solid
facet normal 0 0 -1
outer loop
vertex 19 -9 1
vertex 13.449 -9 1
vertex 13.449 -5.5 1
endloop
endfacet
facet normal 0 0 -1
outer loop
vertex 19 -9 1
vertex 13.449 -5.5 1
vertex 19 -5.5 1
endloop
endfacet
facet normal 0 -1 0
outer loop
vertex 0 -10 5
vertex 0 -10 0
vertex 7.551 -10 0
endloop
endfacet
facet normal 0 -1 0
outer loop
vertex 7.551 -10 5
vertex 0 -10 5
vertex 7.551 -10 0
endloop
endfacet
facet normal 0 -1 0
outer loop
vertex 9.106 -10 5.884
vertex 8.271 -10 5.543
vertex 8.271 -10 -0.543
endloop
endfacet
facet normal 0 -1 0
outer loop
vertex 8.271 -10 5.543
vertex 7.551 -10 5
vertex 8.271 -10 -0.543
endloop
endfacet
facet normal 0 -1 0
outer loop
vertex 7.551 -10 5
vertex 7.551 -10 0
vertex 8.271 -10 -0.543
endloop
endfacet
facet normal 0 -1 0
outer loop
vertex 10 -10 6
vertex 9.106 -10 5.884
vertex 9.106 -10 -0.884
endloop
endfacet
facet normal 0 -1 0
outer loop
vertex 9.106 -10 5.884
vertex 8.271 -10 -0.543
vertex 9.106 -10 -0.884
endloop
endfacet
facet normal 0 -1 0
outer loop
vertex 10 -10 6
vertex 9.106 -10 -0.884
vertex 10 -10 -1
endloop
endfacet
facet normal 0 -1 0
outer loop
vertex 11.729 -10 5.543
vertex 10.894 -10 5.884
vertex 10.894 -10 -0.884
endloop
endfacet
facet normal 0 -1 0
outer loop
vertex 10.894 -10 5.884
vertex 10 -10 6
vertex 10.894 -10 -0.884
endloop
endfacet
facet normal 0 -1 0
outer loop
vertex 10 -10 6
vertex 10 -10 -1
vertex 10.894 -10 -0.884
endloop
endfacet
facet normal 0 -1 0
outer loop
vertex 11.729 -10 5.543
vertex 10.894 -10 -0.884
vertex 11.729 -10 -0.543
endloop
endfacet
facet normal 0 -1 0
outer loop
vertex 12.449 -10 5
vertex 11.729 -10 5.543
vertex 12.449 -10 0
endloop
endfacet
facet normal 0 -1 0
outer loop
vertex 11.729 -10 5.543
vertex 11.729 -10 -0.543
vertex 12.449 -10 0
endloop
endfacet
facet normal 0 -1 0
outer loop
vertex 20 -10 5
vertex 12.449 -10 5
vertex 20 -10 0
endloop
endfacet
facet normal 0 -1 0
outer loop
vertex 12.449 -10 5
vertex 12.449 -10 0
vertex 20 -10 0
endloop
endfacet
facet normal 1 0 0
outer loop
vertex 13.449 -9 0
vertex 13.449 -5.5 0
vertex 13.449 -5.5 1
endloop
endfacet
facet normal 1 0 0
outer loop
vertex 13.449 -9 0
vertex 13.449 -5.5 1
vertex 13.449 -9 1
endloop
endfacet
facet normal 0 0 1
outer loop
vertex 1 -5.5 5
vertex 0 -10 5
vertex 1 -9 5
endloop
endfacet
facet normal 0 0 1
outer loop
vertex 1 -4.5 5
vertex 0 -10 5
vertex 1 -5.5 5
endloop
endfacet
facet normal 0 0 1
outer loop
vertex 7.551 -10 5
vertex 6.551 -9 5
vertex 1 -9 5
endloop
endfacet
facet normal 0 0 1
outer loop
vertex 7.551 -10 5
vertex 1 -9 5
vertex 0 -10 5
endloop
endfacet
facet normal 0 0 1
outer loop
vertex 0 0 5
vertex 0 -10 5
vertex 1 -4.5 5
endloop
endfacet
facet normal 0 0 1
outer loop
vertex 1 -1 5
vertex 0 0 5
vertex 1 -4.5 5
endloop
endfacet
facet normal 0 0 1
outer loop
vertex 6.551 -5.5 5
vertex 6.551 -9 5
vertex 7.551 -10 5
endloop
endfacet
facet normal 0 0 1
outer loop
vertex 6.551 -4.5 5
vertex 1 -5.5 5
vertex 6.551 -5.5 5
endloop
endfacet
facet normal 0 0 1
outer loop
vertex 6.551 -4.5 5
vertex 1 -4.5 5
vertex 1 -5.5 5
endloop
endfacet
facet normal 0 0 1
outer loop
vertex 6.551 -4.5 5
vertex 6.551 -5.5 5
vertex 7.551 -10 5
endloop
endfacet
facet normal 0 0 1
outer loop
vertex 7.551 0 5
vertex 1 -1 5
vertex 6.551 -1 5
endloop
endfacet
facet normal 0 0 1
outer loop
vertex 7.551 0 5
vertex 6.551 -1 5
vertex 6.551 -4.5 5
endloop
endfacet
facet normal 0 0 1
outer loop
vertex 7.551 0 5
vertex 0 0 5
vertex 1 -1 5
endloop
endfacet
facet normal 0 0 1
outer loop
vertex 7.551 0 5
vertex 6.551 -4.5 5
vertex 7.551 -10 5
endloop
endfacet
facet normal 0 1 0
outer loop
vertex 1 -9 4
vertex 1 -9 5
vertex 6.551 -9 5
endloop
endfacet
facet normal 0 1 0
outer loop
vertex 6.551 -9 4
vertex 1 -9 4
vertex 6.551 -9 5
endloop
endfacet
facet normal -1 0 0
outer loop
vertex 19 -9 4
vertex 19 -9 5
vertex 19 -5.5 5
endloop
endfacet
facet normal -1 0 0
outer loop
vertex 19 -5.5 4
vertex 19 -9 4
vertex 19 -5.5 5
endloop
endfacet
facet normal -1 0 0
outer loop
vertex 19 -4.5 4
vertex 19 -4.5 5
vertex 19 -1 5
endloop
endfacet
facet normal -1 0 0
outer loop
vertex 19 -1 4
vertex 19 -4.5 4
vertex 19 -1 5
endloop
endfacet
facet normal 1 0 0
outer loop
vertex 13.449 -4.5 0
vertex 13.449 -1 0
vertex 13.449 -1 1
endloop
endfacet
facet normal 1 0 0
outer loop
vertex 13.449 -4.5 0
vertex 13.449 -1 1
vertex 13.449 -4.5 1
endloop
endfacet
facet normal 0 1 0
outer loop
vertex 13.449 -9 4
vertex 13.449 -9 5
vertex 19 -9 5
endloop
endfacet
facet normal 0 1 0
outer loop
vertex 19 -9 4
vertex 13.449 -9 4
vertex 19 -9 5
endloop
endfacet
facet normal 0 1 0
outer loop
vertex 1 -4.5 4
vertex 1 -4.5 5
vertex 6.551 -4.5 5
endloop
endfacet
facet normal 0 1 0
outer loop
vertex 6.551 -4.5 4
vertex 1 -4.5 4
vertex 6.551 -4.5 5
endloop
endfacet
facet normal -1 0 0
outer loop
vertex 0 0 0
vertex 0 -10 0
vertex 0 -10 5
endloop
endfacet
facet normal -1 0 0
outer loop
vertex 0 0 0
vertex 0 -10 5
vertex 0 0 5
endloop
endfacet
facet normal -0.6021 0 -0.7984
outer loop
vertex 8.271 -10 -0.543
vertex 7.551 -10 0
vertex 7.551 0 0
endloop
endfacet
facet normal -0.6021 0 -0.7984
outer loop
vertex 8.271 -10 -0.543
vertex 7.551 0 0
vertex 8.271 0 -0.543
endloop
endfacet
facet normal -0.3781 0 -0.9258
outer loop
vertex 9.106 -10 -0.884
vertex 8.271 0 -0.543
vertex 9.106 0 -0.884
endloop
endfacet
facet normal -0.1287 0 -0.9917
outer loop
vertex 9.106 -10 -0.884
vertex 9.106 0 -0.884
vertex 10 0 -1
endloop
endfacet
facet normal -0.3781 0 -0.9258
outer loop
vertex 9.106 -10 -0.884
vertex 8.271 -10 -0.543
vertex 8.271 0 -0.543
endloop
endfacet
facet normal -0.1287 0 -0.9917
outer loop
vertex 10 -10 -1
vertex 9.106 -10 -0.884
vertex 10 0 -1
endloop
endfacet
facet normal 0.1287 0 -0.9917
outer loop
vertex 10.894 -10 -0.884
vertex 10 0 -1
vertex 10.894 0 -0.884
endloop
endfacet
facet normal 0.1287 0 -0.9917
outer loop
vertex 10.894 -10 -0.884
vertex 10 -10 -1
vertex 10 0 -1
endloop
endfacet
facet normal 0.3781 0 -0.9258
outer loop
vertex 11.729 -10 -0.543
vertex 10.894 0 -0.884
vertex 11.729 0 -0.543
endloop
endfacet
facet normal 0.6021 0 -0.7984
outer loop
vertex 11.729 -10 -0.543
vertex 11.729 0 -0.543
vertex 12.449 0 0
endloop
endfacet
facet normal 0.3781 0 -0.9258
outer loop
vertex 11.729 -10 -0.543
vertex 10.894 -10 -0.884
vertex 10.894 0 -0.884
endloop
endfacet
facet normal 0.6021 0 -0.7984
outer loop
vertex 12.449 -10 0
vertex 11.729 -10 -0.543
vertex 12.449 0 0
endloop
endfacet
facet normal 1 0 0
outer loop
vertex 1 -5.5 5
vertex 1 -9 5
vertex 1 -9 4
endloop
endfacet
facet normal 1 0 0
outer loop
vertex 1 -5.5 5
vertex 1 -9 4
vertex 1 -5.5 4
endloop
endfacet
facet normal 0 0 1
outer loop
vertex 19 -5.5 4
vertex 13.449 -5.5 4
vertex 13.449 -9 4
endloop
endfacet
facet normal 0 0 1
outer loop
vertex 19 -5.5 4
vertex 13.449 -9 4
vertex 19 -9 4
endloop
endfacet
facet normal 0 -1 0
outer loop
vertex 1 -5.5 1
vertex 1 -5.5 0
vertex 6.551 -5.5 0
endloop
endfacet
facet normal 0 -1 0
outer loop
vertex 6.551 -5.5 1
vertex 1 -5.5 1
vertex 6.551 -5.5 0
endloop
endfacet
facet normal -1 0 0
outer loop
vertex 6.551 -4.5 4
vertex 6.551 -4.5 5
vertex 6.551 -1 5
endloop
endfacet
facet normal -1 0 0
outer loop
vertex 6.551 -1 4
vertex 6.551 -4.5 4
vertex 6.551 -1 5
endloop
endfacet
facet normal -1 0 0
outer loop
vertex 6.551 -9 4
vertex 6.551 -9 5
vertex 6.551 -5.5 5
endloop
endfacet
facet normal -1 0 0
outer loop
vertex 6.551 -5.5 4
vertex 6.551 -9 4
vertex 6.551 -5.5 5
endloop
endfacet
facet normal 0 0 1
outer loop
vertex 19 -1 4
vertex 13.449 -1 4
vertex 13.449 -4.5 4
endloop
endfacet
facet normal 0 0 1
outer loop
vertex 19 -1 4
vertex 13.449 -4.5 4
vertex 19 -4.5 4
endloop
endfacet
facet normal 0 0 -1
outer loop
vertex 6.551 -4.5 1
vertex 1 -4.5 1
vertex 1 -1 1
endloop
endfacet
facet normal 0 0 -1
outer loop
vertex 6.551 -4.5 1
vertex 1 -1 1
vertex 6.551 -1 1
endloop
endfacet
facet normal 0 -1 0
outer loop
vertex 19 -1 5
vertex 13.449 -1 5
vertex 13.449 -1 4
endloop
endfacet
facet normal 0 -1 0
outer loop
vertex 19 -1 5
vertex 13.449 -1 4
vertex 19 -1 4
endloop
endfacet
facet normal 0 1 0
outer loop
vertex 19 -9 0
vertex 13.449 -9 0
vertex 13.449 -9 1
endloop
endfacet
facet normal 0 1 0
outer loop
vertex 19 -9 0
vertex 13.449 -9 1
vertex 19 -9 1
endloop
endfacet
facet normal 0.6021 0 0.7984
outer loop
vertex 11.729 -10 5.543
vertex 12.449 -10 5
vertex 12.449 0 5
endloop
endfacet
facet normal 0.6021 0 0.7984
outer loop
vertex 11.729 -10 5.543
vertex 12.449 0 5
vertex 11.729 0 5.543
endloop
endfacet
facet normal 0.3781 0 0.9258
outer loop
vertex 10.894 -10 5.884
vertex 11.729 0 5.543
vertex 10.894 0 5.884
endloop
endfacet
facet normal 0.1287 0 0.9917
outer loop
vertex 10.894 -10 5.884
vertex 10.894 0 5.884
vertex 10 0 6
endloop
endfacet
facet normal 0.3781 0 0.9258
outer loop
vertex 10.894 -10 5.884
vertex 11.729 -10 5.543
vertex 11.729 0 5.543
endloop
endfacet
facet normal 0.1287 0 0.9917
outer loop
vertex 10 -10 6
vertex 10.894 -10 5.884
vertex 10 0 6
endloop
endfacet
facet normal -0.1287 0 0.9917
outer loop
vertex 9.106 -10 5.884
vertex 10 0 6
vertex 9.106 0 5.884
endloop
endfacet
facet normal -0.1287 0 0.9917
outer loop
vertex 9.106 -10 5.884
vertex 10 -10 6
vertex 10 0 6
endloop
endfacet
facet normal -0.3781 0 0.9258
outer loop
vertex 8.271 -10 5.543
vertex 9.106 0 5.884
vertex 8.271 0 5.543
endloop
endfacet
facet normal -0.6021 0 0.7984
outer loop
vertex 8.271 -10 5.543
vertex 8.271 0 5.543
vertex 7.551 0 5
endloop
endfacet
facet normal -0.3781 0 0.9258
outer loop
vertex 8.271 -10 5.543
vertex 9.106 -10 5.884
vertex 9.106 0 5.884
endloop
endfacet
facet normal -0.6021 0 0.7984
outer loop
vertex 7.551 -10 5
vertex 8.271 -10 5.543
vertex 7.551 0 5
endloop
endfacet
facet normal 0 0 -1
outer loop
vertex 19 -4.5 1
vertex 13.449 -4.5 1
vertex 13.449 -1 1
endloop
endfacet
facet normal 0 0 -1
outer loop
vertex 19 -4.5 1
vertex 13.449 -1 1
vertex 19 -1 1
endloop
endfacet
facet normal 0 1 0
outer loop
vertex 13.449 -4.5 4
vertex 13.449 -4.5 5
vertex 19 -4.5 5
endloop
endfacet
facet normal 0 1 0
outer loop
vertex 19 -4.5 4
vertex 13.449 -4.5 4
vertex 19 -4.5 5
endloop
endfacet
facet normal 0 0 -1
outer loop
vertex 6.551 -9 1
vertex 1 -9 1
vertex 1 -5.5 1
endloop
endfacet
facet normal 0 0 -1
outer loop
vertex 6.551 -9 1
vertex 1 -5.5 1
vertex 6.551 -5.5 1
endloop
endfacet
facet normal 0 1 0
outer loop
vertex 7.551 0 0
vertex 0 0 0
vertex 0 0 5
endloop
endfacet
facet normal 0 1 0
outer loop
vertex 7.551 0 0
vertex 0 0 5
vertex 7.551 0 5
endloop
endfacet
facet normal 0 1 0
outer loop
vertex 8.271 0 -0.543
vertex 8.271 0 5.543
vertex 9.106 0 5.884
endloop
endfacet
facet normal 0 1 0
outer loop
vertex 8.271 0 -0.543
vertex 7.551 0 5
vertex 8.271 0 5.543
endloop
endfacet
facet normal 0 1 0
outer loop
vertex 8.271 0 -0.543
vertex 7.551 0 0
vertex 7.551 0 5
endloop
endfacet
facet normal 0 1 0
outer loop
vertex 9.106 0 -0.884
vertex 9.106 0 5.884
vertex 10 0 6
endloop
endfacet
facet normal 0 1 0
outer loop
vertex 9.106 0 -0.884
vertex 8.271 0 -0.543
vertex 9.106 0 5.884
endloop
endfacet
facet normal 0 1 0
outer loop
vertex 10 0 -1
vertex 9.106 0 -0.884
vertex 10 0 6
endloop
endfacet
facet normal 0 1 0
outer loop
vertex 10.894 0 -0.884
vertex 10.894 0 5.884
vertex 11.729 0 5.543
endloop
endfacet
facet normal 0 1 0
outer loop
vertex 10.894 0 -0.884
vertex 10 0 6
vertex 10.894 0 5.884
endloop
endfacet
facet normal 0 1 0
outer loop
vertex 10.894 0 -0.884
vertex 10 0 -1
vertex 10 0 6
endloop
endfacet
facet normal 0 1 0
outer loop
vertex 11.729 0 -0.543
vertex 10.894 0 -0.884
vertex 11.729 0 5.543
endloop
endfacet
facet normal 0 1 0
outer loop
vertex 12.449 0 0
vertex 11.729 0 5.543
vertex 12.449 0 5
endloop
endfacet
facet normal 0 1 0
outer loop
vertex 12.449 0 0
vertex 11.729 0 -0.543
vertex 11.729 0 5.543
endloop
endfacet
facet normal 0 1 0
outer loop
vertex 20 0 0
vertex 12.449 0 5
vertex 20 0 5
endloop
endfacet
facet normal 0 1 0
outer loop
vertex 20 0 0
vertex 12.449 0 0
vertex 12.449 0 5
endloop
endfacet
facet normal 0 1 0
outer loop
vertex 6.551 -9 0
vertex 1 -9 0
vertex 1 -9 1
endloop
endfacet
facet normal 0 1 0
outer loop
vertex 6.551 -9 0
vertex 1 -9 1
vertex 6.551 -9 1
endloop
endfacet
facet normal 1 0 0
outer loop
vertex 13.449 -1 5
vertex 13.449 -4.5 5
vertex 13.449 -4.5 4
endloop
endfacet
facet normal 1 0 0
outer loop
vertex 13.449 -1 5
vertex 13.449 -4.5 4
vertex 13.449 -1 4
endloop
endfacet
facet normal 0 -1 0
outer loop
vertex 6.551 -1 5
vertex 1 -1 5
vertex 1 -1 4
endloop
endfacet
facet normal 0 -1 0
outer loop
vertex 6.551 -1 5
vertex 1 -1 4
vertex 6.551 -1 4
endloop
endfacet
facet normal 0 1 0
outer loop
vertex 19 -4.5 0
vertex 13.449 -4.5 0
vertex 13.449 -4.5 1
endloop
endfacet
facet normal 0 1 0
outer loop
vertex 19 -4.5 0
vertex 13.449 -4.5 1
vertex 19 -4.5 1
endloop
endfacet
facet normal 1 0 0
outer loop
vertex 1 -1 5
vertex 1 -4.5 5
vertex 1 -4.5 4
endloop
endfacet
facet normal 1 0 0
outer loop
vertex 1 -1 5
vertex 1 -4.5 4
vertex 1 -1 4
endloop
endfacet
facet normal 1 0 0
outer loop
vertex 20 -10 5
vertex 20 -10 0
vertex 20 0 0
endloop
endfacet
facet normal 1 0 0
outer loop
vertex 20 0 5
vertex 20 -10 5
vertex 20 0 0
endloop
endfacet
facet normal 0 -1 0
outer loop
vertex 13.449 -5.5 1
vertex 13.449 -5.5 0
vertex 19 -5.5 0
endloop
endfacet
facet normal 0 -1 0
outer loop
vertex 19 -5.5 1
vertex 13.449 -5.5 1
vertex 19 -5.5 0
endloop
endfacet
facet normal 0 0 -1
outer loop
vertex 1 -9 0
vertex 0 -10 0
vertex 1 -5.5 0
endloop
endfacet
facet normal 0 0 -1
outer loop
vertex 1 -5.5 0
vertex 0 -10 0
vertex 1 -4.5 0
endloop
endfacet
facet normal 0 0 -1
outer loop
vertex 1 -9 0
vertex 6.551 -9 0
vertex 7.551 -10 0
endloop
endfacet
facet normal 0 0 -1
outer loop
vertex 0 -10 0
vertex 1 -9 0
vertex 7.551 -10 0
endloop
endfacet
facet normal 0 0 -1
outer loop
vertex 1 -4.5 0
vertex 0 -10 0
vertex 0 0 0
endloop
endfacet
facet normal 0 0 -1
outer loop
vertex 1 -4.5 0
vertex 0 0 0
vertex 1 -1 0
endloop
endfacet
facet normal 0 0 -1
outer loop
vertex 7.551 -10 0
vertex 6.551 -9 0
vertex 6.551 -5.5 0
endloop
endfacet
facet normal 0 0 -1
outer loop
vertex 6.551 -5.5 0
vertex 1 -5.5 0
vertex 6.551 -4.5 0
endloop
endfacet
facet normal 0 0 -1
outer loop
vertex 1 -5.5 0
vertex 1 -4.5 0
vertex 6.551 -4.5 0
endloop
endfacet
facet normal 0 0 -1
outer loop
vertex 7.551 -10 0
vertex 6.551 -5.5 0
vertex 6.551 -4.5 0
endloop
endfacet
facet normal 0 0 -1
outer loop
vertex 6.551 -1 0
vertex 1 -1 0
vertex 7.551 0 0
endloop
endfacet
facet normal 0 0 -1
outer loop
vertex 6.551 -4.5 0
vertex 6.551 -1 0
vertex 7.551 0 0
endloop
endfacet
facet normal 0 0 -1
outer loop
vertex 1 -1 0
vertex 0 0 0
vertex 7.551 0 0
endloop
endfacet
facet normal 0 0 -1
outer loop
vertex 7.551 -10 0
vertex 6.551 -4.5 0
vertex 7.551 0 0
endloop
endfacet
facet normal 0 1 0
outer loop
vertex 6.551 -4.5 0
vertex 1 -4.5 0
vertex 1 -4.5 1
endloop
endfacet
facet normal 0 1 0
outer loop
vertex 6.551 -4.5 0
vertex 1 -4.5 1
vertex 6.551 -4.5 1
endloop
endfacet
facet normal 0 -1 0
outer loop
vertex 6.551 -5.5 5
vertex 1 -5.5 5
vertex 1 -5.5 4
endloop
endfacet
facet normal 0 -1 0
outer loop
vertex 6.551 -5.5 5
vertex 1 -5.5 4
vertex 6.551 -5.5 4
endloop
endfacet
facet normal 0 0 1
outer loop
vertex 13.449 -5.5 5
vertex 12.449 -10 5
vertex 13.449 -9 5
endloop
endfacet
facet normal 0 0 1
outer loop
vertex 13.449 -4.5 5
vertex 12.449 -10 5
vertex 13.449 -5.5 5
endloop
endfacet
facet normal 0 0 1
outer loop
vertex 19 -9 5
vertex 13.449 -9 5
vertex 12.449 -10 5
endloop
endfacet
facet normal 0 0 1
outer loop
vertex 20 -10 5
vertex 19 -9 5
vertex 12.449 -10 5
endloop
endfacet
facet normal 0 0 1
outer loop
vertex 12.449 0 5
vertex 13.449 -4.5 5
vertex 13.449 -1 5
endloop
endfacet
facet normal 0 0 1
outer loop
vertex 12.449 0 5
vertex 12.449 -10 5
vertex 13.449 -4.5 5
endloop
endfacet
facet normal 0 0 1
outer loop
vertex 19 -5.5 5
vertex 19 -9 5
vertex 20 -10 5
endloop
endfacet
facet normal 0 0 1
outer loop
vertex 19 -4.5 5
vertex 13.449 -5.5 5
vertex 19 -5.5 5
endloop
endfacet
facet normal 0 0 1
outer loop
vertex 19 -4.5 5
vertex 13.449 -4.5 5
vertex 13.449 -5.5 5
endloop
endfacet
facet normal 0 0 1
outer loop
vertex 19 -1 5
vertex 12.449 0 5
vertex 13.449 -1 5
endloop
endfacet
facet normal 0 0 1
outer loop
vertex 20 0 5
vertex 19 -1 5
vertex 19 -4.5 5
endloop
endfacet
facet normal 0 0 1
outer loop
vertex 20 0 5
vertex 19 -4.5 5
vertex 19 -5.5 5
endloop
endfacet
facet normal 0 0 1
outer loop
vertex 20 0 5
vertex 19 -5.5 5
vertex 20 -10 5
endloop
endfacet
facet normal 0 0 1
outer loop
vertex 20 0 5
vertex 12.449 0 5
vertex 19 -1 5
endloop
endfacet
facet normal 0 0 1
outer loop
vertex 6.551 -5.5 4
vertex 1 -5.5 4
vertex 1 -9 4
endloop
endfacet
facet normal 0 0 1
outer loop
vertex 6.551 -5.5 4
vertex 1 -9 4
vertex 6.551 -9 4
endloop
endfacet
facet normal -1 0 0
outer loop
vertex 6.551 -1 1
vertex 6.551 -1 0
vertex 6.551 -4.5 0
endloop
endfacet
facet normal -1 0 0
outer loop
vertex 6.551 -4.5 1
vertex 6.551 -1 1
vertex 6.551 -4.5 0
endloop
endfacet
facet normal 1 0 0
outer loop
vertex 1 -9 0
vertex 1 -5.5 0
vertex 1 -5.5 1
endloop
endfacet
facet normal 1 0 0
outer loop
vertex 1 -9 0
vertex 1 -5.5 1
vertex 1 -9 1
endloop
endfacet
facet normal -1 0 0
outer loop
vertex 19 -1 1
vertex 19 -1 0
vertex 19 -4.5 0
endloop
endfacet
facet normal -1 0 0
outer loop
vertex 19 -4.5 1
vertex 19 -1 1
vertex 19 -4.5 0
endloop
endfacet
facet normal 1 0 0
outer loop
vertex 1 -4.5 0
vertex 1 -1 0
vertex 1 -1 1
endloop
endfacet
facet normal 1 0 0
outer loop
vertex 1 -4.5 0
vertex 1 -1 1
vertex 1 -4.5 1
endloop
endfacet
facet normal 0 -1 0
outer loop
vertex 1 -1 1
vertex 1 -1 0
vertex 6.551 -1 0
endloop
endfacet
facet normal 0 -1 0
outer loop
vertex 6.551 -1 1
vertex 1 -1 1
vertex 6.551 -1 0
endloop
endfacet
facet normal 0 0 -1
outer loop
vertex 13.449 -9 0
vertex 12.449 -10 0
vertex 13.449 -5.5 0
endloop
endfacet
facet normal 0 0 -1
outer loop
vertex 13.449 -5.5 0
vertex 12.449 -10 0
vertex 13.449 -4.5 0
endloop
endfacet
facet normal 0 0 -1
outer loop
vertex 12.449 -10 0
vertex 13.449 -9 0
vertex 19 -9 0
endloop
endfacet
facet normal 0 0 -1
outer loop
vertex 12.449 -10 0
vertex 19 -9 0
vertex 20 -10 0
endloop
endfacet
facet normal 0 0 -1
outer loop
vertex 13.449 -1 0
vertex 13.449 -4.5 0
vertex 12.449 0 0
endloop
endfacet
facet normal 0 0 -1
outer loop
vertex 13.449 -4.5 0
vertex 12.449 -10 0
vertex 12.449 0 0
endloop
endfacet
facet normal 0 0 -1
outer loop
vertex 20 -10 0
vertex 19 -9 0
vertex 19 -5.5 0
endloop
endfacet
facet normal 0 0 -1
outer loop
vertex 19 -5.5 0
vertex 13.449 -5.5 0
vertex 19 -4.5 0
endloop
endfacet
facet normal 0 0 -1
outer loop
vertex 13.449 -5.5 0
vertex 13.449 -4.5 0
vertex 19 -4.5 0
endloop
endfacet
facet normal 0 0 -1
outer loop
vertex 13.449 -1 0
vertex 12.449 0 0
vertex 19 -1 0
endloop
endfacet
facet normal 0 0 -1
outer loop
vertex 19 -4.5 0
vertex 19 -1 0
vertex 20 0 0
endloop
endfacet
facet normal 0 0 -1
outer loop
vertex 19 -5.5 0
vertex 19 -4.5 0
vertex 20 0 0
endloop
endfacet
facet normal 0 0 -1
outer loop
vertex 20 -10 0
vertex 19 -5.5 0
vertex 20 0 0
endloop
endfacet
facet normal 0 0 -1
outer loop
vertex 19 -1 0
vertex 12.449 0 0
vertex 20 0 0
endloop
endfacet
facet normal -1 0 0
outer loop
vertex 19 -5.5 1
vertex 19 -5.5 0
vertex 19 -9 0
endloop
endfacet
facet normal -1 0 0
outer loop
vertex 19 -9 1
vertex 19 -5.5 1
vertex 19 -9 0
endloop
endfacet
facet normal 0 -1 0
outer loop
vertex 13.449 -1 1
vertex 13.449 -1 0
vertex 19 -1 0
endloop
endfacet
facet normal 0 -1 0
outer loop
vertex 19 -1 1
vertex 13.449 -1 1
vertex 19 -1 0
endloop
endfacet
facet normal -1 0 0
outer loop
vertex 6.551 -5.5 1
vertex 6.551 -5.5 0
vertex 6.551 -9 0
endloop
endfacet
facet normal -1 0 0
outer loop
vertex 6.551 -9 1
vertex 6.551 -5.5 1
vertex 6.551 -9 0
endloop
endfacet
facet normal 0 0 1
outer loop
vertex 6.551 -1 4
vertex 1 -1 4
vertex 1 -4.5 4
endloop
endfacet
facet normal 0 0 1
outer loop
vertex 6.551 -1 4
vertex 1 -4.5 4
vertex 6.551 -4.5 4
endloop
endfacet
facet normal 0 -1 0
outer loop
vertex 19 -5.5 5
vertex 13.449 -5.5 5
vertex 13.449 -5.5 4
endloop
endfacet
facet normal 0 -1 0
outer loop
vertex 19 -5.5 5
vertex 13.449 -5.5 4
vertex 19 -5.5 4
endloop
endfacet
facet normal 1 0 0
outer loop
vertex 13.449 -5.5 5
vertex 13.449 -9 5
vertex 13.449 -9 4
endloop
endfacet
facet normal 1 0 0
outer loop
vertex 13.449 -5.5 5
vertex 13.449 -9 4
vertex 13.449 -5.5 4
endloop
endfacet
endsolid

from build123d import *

# Parameters (mm, degrees)
F0_W     = 20
F0_H     = 10
F1_DEPTH = 5
F3_DEPTH = 10
F4_W     = 5.5505102572
F4_H     = 3.5
F5_DEPTH = 1
F6_W     = 5.5505102572
F6_H     = 3.5
F7_DEPTH = 1


with BuildPart() as f1:
    # F0 (on Top) → F1 (new body)
    with BuildSketch(Plane.XY):
        with Locations((10, -5)):
            Rectangle(F0_W, F0_H)
    extrude(amount=F1_DEPTH)

    # F2 (on face) → F3 (join)
    with BuildSketch(Plane.XZ.offset(10)):
        with BuildLine():
            Line((7.5505102572, 5), (12.4494897428, 5))
            ThreePointArc((12.4494897428, 5), (10, 6), (7.5505102572, 5))
        make_face()
        with BuildLine():
            ThreePointArc((7.5505102572, 0), (10, -1), (12.4494897428, 0))
            Line((12.4494897428, 0), (7.5505102572, 0))
        make_face()
    extrude(amount=-F3_DEPTH)

    # F4 (on face) → F5 (cut)
    with BuildSketch(Plane.XY.offset(5)):
        with Locations((3.7752551286, -2.75)):
            Rectangle(F4_W, F4_H)
        with Locations((3.7752551286, -7.25)):
            Rectangle(F4_W, F4_H)
        with Locations((16.2247448714, -2.75)):
            Rectangle(F4_W, F4_H)
        with Locations((16.2247448714, -7.25)):
            Rectangle(F4_W, F4_H)
    extrude(amount=-F5_DEPTH, mode=Mode.SUBTRACT)

    # F6 (on face) → F7 (cut)
    with BuildSketch(Plane(origin=(0, 0, 0), x_dir=(1, 0, 0), z_dir=(0, 0, -1))):
        with Locations((3.7752551286, 7.25)):
            Rectangle(F6_W, F6_H)
        with Locations((16.2247448714, 7.25)):
            Rectangle(F6_W, F6_H)
        with Locations((16.2247448714, 2.75)):
            Rectangle(F6_W, F6_H)
        with Locations((3.7752551286, 2.75)):
            Rectangle(F6_W, F6_H)
    extrude(amount=-F7_DEPTH, mode=Mode.SUBTRACT)


solid = f1.part
